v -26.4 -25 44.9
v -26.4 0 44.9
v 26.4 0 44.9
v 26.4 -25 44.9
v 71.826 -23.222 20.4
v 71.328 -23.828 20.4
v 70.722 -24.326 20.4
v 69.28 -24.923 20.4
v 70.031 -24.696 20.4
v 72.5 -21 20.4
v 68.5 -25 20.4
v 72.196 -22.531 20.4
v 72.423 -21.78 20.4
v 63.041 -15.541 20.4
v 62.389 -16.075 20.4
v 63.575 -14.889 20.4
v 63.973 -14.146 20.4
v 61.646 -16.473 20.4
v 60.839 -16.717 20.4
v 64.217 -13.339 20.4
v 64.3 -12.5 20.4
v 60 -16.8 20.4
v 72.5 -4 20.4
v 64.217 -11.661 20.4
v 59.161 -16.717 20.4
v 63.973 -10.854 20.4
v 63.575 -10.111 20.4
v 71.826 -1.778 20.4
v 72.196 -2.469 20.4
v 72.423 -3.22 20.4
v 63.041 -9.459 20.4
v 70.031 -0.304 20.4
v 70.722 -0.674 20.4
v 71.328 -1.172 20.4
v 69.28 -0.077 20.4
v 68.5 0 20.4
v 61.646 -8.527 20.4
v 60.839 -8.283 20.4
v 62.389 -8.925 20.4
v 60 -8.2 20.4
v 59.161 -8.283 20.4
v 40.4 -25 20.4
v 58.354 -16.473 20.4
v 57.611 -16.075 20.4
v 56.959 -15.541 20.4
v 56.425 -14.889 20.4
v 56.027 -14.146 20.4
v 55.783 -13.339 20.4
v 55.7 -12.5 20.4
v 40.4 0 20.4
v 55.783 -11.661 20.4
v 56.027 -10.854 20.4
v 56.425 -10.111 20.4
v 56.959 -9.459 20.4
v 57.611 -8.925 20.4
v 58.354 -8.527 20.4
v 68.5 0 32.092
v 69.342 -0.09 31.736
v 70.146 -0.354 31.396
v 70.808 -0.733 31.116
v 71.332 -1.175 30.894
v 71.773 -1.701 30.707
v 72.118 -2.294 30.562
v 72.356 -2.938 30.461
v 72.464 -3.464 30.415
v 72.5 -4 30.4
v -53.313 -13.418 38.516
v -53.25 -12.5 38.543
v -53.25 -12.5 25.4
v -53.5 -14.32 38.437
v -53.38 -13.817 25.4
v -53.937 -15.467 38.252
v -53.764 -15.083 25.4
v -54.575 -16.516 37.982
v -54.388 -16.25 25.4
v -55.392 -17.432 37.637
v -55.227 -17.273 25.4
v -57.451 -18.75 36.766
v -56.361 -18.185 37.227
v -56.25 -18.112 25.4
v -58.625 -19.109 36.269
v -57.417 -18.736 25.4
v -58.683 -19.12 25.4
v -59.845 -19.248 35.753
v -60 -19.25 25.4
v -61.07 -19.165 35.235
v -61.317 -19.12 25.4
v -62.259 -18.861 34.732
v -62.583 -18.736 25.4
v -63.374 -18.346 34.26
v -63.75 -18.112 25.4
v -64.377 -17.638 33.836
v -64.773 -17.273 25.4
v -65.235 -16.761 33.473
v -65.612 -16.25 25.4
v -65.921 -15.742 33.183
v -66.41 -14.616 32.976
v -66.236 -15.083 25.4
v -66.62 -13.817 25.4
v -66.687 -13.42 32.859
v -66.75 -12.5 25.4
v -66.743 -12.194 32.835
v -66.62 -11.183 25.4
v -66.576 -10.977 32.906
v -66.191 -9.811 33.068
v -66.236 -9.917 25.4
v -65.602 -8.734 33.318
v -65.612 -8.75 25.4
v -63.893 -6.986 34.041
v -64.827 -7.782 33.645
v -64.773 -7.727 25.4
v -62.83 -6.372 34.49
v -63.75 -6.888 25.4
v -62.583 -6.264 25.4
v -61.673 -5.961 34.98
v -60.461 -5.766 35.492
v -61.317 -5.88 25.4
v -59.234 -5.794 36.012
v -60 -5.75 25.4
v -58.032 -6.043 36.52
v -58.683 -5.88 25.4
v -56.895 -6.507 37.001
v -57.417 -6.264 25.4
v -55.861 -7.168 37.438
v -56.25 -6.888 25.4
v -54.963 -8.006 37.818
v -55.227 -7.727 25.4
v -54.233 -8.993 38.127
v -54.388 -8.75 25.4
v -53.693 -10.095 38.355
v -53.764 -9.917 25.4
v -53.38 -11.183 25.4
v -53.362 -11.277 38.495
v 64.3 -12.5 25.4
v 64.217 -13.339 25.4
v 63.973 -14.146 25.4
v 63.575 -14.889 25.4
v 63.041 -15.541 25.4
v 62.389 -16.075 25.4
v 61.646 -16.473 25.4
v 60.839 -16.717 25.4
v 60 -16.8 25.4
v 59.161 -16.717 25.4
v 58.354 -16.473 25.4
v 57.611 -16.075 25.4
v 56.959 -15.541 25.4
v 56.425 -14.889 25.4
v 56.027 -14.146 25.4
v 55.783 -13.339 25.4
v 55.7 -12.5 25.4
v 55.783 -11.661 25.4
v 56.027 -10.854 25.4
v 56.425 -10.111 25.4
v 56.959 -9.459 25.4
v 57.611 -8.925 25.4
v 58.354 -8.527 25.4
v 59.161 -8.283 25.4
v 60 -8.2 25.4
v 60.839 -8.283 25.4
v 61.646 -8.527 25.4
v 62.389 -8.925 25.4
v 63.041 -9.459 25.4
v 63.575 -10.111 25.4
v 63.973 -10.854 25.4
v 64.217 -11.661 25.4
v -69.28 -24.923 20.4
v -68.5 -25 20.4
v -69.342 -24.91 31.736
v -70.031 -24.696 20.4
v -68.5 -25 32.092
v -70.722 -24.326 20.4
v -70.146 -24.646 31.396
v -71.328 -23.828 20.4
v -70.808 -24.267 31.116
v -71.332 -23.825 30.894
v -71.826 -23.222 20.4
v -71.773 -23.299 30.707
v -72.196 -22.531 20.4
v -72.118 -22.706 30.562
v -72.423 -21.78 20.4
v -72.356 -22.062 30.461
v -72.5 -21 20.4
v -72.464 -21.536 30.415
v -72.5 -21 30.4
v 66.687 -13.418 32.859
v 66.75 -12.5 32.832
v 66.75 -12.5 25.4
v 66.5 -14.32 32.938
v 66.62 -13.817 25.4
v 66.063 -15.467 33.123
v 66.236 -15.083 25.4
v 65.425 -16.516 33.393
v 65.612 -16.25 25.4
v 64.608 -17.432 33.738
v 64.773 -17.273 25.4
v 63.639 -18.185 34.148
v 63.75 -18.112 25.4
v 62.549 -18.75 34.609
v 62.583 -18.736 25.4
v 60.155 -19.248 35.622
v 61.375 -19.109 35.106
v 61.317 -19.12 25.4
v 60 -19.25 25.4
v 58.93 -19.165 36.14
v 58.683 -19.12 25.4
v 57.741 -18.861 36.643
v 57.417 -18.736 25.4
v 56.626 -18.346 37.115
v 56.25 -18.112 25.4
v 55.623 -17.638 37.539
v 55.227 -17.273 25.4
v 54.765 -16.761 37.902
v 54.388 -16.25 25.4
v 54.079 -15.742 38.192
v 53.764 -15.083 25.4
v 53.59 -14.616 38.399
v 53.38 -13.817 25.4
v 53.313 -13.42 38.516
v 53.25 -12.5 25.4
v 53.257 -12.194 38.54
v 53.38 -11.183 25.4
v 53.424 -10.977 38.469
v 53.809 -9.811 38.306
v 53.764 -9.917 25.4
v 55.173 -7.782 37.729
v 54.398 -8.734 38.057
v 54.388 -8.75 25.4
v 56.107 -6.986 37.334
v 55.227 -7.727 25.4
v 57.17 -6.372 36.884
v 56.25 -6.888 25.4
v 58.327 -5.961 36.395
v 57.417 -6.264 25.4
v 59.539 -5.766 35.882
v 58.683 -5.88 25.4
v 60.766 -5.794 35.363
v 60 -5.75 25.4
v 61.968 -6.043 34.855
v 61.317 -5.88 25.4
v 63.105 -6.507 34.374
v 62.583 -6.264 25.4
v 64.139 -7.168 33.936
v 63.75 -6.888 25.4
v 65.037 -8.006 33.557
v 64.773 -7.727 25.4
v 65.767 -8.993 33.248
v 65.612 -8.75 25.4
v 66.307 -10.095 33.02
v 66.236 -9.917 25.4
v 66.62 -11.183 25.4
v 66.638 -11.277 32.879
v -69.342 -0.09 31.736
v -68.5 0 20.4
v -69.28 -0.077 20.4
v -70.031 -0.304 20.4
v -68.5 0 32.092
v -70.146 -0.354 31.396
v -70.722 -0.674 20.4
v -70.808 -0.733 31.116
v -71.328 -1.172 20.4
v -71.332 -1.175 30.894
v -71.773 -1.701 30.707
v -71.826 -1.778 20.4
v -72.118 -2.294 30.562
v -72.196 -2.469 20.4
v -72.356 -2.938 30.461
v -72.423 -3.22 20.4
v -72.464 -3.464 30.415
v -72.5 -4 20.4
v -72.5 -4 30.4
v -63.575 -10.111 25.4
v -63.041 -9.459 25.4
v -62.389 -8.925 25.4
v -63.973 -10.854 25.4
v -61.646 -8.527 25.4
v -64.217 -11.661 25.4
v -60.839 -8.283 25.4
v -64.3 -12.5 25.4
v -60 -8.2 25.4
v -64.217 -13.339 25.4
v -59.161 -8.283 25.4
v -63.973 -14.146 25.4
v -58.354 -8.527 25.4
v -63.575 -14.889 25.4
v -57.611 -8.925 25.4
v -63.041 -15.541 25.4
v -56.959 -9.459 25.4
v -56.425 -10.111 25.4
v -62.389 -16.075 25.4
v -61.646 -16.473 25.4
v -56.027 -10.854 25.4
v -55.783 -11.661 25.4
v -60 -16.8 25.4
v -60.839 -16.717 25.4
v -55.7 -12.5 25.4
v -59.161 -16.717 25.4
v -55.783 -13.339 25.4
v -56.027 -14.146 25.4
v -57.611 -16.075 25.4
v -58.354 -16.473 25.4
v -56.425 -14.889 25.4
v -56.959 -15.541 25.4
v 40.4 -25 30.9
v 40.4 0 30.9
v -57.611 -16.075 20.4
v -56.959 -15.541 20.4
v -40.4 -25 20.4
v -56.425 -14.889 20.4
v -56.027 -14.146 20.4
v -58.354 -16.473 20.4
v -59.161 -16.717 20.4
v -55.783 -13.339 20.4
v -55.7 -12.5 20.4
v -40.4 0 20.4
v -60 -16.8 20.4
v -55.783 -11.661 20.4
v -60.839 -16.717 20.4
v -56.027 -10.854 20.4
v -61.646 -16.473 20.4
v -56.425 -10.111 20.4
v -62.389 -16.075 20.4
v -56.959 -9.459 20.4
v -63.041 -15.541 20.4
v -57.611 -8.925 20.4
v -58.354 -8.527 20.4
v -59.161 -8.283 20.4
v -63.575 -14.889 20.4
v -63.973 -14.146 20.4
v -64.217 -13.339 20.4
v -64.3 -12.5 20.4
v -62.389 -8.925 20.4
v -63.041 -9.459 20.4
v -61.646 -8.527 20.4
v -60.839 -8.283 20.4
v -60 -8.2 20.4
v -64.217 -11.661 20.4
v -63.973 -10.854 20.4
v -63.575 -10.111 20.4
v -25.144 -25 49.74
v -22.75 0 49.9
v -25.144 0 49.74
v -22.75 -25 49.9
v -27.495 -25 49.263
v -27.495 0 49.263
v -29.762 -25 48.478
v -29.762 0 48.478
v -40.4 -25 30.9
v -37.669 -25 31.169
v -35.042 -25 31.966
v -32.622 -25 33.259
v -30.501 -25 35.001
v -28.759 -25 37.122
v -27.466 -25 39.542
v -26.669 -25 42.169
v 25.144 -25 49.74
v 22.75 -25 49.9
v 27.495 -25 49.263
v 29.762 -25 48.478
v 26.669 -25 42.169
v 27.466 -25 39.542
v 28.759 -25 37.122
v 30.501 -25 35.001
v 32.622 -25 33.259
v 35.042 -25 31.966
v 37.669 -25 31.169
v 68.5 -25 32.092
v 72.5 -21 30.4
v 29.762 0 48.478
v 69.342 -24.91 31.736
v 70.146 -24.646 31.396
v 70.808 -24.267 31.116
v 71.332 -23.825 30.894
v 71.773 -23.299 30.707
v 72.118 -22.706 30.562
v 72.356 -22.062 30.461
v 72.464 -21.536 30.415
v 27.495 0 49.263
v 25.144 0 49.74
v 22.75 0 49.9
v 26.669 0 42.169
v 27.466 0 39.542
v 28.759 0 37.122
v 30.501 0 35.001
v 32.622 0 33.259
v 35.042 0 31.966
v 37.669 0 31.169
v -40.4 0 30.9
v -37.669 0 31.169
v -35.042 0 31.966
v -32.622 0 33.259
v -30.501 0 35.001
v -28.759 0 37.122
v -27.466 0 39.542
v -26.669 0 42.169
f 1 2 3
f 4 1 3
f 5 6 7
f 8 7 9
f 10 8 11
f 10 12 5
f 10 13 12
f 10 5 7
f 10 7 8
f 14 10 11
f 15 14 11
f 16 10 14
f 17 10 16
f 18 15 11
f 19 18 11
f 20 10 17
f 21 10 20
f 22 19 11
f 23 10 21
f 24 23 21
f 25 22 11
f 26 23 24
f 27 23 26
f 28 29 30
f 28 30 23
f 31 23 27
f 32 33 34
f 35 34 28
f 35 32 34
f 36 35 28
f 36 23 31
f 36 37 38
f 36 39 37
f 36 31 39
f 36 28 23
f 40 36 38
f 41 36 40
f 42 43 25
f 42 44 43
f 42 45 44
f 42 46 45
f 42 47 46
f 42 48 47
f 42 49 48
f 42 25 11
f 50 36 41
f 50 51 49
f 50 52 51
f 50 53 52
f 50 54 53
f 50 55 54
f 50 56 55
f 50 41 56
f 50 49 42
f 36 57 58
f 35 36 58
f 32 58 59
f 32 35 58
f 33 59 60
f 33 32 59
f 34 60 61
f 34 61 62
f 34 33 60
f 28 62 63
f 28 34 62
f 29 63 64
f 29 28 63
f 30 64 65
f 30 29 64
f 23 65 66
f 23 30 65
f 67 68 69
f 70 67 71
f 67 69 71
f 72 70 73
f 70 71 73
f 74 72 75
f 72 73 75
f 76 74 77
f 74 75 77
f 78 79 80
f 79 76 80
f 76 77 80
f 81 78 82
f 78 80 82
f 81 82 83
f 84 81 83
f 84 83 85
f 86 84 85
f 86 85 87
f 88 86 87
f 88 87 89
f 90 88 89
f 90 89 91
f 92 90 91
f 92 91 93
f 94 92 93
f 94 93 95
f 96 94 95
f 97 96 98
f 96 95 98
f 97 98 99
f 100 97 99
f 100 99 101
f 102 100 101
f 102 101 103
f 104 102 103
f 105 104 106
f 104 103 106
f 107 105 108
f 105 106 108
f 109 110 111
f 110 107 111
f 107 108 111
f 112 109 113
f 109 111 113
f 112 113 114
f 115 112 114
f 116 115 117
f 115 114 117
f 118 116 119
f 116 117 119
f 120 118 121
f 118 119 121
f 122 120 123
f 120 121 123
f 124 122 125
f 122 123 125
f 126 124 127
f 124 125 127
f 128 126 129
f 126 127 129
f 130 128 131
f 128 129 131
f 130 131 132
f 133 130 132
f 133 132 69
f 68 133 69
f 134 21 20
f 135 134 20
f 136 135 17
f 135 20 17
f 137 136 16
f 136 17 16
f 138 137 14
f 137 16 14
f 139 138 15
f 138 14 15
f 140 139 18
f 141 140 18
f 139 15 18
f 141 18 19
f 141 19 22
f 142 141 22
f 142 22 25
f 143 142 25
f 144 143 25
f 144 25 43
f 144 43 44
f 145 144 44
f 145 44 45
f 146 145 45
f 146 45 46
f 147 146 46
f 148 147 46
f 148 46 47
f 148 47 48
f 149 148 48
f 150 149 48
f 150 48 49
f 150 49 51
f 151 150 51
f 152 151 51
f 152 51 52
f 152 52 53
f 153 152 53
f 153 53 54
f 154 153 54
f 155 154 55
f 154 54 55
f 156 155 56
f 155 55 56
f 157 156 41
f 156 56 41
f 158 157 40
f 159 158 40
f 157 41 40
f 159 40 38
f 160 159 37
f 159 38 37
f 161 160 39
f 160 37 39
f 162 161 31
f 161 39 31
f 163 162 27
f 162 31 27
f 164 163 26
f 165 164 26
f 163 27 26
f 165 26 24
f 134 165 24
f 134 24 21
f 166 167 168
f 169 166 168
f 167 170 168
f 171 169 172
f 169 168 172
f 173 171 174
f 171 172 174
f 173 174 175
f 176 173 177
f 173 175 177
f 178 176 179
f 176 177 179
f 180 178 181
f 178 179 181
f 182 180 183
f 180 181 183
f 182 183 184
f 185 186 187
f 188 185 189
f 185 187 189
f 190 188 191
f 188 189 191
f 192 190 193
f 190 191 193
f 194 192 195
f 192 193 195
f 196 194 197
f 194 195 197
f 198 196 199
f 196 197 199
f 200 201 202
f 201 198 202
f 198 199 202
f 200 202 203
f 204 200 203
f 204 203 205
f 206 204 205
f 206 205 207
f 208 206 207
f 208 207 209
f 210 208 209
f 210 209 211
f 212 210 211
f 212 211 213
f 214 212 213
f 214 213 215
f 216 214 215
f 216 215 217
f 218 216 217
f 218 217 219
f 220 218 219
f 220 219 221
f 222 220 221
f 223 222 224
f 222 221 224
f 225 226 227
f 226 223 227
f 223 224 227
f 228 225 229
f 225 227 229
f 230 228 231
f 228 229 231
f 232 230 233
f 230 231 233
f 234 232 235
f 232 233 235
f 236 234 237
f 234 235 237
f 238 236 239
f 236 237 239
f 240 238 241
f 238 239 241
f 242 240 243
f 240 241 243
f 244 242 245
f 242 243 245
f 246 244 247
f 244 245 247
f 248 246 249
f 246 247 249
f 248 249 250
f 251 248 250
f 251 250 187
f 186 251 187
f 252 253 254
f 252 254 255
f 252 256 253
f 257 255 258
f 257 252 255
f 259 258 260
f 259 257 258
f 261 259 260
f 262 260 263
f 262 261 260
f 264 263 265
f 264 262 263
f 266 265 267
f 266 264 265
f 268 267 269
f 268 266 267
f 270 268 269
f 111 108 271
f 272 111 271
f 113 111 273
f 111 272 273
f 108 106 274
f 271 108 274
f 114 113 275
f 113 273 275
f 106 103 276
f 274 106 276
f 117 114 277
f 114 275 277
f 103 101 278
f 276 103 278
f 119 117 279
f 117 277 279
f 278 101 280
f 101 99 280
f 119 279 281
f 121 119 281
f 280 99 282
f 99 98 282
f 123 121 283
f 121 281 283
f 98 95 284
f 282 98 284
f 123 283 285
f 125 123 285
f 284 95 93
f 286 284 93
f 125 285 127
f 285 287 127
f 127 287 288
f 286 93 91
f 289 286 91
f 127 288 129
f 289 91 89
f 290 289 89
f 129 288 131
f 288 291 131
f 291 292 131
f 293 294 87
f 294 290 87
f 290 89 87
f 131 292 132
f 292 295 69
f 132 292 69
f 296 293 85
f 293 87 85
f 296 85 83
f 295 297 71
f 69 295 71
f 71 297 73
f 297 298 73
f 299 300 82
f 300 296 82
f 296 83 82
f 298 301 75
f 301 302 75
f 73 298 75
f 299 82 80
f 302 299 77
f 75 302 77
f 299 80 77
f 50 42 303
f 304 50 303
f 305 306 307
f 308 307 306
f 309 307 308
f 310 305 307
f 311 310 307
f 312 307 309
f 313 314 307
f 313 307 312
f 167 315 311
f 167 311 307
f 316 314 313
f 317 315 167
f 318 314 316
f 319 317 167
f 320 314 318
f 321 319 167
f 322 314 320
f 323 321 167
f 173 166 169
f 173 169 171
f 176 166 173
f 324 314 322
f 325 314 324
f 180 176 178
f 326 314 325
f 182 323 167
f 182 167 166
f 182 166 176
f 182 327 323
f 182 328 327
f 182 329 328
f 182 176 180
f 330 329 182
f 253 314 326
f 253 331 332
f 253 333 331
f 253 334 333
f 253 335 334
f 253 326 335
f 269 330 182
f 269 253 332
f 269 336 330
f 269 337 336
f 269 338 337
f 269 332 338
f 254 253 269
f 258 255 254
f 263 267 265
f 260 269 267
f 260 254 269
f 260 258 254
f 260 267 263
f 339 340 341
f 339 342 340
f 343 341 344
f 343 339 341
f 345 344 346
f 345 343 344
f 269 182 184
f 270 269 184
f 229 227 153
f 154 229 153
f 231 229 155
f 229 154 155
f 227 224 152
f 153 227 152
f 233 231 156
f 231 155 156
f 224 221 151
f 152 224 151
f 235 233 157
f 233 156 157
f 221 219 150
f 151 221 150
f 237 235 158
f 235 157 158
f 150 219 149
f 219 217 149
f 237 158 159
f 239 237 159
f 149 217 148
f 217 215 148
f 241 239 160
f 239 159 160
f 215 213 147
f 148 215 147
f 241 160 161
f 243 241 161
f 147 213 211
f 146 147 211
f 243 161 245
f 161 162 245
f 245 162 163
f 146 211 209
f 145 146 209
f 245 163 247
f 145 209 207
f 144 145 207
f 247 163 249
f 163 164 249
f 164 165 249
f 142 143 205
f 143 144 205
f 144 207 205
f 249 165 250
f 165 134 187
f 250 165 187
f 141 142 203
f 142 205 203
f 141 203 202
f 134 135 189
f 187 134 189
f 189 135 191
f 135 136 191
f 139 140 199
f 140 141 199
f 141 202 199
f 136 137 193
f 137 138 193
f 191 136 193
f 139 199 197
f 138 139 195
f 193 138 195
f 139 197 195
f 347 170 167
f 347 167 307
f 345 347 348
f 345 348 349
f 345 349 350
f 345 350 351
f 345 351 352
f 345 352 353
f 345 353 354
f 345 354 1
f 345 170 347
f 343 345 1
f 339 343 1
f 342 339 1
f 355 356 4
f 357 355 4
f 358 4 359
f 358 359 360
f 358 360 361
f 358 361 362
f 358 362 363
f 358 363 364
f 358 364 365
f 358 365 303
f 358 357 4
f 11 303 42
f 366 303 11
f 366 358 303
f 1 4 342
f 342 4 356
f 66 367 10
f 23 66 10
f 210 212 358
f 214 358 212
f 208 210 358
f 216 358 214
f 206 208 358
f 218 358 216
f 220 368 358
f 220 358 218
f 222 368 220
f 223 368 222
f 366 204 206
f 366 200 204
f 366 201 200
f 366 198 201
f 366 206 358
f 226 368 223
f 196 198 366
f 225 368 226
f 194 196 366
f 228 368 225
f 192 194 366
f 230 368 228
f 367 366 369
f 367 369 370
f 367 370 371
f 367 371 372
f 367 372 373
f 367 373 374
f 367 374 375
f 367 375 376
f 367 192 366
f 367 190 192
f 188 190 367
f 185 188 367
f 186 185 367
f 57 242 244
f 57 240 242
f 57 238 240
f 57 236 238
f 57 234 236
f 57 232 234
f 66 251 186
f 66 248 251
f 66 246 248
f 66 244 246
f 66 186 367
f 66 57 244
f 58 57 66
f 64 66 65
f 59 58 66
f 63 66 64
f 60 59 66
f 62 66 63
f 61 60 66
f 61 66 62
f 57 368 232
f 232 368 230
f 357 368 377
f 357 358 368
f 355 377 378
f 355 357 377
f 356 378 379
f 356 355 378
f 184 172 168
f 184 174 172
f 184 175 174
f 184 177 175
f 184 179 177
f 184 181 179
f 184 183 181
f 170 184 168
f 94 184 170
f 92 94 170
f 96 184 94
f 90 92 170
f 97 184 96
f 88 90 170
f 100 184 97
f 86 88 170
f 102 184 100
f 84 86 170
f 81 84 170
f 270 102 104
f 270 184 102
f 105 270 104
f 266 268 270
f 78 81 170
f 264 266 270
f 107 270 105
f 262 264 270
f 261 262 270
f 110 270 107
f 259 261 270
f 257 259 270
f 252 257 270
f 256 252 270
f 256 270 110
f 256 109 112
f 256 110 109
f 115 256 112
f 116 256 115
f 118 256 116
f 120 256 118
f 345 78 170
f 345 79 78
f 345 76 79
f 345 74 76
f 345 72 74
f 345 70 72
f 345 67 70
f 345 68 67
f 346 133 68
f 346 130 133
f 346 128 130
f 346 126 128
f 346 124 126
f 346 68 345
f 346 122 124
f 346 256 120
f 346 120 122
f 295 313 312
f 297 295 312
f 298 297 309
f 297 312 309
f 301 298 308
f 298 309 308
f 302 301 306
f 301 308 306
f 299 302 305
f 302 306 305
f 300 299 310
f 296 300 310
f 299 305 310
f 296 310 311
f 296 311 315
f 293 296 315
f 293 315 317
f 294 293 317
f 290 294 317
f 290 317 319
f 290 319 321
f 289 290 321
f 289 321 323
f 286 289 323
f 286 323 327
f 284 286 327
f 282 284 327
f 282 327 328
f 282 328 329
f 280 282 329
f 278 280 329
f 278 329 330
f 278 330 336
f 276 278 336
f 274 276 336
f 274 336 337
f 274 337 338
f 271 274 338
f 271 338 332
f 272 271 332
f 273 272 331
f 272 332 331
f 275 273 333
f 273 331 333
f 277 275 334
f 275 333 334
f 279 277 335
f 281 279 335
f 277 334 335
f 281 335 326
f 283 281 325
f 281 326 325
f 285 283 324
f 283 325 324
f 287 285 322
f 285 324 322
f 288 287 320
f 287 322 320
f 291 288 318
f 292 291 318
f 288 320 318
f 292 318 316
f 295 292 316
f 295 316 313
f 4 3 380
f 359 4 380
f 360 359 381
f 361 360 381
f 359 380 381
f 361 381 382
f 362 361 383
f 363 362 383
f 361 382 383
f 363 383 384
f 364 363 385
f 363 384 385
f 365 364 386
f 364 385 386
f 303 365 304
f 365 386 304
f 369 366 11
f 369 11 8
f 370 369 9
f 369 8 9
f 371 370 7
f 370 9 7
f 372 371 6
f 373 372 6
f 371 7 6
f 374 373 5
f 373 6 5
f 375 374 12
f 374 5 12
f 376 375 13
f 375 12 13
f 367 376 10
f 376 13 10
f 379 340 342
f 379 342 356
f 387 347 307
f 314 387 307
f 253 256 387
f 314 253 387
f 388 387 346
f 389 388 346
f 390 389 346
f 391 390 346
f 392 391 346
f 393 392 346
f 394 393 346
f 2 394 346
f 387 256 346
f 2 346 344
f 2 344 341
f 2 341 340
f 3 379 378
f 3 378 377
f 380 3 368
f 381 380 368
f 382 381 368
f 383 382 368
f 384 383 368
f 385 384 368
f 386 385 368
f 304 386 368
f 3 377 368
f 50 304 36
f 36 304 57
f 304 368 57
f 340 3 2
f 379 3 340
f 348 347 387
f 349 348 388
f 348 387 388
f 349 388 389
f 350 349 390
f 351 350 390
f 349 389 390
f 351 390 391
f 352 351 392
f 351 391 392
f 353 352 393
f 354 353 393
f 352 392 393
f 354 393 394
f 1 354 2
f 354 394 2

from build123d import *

# Parameters (mm, degrees)
PAD_DEPTH       = 25
SKETCH001_R     = 4.3
POCKET_DEPTH    = 29.501
SKETCH002_R     = 6.75
POCKET001_DEPTH = 24.501
FILLET_R        = 4
FILLET001_R     = 18


with BuildPart() as part:
    # Sketch → Pad (new body)
    with BuildSketch(Plane.XZ):
        with BuildLine():
            ThreePointArc((-40.4, 30.9), (-30.500505, 35.000505), (-26.4, 44.9))
            Line((-26.4, 44.9), (26.4, 44.9))
            ThreePointArc((26.4, 44.9), (30.500505, 35.000505), (40.4, 30.9))
            Line((40.4, 20.4), (40.4, 30.9))
            Line((72.5, 20.4), (40.4, 20.4))
            Line((72.5, 30.4), (72.5, 20.4))
            Line((26.4, 49.9), (72.5, 30.4))
            Line((-26.4, 49.9), (26.4, 49.9))
            Line((-72.5, 30.4), (-26.4, 49.9))
            Line((-72.5, 20.4), (-72.5, 30.4))
            Line((-40.4, 20.4), (-72.5, 20.4))
            Line((-40.4, 30.9), (-40.4, 20.4))
        make_face()
    extrude(amount=PAD_DEPTH)

    # Sketch001 (on Face11 of Pad) → Pocket (cut, through all)
    with BuildSketch(Plane(origin=(0, 0, 20.4), x_dir=(1, 0, 0), z_dir=(0, 0, -1))):
        with Locations((-60, 12.5)):
            Circle(SKETCH001_R)
        with Locations((60, 12.5)):
            Circle(SKETCH001_R)
    extrude(amount=-POCKET_DEPTH, mode=Mode.SUBTRACT)

    # Sketch002 (on Face6 of Pocket) → Pocket001 (cut, through all)
    with BuildSketch(Plane(origin=(0, 0, 25.4), x_dir=(1, 0, 0), z_dir=(0, 0, -1))):
        with Locations((-60, 12.5)):
            Circle(SKETCH002_R)
        with Locations((60, 12.5)):
            Circle(SKETCH002_R)
    extrude(amount=-POCKET001_DEPTH, mode=Mode.SUBTRACT)

    # Fillet
    fillet_edges = [part.edges().sort_by_distance(p)[0] for p in [
        (-72.5, -25, 25.4),
        (-72.5, 0, 25.4),
        (72.5, -25, 25.4),
        (72.5, 0, 25.4),
    ]]
    fillet(fillet_edges, radius=FILLET_R)

    # Fillet001
    fillet001_edges = [part.edges().sort_by_distance(p)[0] for p in [
        (-26.4, -12.5, 49.9),
        (26.4, -12.5, 49.9),
    ]]
    fillet(fillet001_edges, radius=FILLET001_R)


solid = part.part
